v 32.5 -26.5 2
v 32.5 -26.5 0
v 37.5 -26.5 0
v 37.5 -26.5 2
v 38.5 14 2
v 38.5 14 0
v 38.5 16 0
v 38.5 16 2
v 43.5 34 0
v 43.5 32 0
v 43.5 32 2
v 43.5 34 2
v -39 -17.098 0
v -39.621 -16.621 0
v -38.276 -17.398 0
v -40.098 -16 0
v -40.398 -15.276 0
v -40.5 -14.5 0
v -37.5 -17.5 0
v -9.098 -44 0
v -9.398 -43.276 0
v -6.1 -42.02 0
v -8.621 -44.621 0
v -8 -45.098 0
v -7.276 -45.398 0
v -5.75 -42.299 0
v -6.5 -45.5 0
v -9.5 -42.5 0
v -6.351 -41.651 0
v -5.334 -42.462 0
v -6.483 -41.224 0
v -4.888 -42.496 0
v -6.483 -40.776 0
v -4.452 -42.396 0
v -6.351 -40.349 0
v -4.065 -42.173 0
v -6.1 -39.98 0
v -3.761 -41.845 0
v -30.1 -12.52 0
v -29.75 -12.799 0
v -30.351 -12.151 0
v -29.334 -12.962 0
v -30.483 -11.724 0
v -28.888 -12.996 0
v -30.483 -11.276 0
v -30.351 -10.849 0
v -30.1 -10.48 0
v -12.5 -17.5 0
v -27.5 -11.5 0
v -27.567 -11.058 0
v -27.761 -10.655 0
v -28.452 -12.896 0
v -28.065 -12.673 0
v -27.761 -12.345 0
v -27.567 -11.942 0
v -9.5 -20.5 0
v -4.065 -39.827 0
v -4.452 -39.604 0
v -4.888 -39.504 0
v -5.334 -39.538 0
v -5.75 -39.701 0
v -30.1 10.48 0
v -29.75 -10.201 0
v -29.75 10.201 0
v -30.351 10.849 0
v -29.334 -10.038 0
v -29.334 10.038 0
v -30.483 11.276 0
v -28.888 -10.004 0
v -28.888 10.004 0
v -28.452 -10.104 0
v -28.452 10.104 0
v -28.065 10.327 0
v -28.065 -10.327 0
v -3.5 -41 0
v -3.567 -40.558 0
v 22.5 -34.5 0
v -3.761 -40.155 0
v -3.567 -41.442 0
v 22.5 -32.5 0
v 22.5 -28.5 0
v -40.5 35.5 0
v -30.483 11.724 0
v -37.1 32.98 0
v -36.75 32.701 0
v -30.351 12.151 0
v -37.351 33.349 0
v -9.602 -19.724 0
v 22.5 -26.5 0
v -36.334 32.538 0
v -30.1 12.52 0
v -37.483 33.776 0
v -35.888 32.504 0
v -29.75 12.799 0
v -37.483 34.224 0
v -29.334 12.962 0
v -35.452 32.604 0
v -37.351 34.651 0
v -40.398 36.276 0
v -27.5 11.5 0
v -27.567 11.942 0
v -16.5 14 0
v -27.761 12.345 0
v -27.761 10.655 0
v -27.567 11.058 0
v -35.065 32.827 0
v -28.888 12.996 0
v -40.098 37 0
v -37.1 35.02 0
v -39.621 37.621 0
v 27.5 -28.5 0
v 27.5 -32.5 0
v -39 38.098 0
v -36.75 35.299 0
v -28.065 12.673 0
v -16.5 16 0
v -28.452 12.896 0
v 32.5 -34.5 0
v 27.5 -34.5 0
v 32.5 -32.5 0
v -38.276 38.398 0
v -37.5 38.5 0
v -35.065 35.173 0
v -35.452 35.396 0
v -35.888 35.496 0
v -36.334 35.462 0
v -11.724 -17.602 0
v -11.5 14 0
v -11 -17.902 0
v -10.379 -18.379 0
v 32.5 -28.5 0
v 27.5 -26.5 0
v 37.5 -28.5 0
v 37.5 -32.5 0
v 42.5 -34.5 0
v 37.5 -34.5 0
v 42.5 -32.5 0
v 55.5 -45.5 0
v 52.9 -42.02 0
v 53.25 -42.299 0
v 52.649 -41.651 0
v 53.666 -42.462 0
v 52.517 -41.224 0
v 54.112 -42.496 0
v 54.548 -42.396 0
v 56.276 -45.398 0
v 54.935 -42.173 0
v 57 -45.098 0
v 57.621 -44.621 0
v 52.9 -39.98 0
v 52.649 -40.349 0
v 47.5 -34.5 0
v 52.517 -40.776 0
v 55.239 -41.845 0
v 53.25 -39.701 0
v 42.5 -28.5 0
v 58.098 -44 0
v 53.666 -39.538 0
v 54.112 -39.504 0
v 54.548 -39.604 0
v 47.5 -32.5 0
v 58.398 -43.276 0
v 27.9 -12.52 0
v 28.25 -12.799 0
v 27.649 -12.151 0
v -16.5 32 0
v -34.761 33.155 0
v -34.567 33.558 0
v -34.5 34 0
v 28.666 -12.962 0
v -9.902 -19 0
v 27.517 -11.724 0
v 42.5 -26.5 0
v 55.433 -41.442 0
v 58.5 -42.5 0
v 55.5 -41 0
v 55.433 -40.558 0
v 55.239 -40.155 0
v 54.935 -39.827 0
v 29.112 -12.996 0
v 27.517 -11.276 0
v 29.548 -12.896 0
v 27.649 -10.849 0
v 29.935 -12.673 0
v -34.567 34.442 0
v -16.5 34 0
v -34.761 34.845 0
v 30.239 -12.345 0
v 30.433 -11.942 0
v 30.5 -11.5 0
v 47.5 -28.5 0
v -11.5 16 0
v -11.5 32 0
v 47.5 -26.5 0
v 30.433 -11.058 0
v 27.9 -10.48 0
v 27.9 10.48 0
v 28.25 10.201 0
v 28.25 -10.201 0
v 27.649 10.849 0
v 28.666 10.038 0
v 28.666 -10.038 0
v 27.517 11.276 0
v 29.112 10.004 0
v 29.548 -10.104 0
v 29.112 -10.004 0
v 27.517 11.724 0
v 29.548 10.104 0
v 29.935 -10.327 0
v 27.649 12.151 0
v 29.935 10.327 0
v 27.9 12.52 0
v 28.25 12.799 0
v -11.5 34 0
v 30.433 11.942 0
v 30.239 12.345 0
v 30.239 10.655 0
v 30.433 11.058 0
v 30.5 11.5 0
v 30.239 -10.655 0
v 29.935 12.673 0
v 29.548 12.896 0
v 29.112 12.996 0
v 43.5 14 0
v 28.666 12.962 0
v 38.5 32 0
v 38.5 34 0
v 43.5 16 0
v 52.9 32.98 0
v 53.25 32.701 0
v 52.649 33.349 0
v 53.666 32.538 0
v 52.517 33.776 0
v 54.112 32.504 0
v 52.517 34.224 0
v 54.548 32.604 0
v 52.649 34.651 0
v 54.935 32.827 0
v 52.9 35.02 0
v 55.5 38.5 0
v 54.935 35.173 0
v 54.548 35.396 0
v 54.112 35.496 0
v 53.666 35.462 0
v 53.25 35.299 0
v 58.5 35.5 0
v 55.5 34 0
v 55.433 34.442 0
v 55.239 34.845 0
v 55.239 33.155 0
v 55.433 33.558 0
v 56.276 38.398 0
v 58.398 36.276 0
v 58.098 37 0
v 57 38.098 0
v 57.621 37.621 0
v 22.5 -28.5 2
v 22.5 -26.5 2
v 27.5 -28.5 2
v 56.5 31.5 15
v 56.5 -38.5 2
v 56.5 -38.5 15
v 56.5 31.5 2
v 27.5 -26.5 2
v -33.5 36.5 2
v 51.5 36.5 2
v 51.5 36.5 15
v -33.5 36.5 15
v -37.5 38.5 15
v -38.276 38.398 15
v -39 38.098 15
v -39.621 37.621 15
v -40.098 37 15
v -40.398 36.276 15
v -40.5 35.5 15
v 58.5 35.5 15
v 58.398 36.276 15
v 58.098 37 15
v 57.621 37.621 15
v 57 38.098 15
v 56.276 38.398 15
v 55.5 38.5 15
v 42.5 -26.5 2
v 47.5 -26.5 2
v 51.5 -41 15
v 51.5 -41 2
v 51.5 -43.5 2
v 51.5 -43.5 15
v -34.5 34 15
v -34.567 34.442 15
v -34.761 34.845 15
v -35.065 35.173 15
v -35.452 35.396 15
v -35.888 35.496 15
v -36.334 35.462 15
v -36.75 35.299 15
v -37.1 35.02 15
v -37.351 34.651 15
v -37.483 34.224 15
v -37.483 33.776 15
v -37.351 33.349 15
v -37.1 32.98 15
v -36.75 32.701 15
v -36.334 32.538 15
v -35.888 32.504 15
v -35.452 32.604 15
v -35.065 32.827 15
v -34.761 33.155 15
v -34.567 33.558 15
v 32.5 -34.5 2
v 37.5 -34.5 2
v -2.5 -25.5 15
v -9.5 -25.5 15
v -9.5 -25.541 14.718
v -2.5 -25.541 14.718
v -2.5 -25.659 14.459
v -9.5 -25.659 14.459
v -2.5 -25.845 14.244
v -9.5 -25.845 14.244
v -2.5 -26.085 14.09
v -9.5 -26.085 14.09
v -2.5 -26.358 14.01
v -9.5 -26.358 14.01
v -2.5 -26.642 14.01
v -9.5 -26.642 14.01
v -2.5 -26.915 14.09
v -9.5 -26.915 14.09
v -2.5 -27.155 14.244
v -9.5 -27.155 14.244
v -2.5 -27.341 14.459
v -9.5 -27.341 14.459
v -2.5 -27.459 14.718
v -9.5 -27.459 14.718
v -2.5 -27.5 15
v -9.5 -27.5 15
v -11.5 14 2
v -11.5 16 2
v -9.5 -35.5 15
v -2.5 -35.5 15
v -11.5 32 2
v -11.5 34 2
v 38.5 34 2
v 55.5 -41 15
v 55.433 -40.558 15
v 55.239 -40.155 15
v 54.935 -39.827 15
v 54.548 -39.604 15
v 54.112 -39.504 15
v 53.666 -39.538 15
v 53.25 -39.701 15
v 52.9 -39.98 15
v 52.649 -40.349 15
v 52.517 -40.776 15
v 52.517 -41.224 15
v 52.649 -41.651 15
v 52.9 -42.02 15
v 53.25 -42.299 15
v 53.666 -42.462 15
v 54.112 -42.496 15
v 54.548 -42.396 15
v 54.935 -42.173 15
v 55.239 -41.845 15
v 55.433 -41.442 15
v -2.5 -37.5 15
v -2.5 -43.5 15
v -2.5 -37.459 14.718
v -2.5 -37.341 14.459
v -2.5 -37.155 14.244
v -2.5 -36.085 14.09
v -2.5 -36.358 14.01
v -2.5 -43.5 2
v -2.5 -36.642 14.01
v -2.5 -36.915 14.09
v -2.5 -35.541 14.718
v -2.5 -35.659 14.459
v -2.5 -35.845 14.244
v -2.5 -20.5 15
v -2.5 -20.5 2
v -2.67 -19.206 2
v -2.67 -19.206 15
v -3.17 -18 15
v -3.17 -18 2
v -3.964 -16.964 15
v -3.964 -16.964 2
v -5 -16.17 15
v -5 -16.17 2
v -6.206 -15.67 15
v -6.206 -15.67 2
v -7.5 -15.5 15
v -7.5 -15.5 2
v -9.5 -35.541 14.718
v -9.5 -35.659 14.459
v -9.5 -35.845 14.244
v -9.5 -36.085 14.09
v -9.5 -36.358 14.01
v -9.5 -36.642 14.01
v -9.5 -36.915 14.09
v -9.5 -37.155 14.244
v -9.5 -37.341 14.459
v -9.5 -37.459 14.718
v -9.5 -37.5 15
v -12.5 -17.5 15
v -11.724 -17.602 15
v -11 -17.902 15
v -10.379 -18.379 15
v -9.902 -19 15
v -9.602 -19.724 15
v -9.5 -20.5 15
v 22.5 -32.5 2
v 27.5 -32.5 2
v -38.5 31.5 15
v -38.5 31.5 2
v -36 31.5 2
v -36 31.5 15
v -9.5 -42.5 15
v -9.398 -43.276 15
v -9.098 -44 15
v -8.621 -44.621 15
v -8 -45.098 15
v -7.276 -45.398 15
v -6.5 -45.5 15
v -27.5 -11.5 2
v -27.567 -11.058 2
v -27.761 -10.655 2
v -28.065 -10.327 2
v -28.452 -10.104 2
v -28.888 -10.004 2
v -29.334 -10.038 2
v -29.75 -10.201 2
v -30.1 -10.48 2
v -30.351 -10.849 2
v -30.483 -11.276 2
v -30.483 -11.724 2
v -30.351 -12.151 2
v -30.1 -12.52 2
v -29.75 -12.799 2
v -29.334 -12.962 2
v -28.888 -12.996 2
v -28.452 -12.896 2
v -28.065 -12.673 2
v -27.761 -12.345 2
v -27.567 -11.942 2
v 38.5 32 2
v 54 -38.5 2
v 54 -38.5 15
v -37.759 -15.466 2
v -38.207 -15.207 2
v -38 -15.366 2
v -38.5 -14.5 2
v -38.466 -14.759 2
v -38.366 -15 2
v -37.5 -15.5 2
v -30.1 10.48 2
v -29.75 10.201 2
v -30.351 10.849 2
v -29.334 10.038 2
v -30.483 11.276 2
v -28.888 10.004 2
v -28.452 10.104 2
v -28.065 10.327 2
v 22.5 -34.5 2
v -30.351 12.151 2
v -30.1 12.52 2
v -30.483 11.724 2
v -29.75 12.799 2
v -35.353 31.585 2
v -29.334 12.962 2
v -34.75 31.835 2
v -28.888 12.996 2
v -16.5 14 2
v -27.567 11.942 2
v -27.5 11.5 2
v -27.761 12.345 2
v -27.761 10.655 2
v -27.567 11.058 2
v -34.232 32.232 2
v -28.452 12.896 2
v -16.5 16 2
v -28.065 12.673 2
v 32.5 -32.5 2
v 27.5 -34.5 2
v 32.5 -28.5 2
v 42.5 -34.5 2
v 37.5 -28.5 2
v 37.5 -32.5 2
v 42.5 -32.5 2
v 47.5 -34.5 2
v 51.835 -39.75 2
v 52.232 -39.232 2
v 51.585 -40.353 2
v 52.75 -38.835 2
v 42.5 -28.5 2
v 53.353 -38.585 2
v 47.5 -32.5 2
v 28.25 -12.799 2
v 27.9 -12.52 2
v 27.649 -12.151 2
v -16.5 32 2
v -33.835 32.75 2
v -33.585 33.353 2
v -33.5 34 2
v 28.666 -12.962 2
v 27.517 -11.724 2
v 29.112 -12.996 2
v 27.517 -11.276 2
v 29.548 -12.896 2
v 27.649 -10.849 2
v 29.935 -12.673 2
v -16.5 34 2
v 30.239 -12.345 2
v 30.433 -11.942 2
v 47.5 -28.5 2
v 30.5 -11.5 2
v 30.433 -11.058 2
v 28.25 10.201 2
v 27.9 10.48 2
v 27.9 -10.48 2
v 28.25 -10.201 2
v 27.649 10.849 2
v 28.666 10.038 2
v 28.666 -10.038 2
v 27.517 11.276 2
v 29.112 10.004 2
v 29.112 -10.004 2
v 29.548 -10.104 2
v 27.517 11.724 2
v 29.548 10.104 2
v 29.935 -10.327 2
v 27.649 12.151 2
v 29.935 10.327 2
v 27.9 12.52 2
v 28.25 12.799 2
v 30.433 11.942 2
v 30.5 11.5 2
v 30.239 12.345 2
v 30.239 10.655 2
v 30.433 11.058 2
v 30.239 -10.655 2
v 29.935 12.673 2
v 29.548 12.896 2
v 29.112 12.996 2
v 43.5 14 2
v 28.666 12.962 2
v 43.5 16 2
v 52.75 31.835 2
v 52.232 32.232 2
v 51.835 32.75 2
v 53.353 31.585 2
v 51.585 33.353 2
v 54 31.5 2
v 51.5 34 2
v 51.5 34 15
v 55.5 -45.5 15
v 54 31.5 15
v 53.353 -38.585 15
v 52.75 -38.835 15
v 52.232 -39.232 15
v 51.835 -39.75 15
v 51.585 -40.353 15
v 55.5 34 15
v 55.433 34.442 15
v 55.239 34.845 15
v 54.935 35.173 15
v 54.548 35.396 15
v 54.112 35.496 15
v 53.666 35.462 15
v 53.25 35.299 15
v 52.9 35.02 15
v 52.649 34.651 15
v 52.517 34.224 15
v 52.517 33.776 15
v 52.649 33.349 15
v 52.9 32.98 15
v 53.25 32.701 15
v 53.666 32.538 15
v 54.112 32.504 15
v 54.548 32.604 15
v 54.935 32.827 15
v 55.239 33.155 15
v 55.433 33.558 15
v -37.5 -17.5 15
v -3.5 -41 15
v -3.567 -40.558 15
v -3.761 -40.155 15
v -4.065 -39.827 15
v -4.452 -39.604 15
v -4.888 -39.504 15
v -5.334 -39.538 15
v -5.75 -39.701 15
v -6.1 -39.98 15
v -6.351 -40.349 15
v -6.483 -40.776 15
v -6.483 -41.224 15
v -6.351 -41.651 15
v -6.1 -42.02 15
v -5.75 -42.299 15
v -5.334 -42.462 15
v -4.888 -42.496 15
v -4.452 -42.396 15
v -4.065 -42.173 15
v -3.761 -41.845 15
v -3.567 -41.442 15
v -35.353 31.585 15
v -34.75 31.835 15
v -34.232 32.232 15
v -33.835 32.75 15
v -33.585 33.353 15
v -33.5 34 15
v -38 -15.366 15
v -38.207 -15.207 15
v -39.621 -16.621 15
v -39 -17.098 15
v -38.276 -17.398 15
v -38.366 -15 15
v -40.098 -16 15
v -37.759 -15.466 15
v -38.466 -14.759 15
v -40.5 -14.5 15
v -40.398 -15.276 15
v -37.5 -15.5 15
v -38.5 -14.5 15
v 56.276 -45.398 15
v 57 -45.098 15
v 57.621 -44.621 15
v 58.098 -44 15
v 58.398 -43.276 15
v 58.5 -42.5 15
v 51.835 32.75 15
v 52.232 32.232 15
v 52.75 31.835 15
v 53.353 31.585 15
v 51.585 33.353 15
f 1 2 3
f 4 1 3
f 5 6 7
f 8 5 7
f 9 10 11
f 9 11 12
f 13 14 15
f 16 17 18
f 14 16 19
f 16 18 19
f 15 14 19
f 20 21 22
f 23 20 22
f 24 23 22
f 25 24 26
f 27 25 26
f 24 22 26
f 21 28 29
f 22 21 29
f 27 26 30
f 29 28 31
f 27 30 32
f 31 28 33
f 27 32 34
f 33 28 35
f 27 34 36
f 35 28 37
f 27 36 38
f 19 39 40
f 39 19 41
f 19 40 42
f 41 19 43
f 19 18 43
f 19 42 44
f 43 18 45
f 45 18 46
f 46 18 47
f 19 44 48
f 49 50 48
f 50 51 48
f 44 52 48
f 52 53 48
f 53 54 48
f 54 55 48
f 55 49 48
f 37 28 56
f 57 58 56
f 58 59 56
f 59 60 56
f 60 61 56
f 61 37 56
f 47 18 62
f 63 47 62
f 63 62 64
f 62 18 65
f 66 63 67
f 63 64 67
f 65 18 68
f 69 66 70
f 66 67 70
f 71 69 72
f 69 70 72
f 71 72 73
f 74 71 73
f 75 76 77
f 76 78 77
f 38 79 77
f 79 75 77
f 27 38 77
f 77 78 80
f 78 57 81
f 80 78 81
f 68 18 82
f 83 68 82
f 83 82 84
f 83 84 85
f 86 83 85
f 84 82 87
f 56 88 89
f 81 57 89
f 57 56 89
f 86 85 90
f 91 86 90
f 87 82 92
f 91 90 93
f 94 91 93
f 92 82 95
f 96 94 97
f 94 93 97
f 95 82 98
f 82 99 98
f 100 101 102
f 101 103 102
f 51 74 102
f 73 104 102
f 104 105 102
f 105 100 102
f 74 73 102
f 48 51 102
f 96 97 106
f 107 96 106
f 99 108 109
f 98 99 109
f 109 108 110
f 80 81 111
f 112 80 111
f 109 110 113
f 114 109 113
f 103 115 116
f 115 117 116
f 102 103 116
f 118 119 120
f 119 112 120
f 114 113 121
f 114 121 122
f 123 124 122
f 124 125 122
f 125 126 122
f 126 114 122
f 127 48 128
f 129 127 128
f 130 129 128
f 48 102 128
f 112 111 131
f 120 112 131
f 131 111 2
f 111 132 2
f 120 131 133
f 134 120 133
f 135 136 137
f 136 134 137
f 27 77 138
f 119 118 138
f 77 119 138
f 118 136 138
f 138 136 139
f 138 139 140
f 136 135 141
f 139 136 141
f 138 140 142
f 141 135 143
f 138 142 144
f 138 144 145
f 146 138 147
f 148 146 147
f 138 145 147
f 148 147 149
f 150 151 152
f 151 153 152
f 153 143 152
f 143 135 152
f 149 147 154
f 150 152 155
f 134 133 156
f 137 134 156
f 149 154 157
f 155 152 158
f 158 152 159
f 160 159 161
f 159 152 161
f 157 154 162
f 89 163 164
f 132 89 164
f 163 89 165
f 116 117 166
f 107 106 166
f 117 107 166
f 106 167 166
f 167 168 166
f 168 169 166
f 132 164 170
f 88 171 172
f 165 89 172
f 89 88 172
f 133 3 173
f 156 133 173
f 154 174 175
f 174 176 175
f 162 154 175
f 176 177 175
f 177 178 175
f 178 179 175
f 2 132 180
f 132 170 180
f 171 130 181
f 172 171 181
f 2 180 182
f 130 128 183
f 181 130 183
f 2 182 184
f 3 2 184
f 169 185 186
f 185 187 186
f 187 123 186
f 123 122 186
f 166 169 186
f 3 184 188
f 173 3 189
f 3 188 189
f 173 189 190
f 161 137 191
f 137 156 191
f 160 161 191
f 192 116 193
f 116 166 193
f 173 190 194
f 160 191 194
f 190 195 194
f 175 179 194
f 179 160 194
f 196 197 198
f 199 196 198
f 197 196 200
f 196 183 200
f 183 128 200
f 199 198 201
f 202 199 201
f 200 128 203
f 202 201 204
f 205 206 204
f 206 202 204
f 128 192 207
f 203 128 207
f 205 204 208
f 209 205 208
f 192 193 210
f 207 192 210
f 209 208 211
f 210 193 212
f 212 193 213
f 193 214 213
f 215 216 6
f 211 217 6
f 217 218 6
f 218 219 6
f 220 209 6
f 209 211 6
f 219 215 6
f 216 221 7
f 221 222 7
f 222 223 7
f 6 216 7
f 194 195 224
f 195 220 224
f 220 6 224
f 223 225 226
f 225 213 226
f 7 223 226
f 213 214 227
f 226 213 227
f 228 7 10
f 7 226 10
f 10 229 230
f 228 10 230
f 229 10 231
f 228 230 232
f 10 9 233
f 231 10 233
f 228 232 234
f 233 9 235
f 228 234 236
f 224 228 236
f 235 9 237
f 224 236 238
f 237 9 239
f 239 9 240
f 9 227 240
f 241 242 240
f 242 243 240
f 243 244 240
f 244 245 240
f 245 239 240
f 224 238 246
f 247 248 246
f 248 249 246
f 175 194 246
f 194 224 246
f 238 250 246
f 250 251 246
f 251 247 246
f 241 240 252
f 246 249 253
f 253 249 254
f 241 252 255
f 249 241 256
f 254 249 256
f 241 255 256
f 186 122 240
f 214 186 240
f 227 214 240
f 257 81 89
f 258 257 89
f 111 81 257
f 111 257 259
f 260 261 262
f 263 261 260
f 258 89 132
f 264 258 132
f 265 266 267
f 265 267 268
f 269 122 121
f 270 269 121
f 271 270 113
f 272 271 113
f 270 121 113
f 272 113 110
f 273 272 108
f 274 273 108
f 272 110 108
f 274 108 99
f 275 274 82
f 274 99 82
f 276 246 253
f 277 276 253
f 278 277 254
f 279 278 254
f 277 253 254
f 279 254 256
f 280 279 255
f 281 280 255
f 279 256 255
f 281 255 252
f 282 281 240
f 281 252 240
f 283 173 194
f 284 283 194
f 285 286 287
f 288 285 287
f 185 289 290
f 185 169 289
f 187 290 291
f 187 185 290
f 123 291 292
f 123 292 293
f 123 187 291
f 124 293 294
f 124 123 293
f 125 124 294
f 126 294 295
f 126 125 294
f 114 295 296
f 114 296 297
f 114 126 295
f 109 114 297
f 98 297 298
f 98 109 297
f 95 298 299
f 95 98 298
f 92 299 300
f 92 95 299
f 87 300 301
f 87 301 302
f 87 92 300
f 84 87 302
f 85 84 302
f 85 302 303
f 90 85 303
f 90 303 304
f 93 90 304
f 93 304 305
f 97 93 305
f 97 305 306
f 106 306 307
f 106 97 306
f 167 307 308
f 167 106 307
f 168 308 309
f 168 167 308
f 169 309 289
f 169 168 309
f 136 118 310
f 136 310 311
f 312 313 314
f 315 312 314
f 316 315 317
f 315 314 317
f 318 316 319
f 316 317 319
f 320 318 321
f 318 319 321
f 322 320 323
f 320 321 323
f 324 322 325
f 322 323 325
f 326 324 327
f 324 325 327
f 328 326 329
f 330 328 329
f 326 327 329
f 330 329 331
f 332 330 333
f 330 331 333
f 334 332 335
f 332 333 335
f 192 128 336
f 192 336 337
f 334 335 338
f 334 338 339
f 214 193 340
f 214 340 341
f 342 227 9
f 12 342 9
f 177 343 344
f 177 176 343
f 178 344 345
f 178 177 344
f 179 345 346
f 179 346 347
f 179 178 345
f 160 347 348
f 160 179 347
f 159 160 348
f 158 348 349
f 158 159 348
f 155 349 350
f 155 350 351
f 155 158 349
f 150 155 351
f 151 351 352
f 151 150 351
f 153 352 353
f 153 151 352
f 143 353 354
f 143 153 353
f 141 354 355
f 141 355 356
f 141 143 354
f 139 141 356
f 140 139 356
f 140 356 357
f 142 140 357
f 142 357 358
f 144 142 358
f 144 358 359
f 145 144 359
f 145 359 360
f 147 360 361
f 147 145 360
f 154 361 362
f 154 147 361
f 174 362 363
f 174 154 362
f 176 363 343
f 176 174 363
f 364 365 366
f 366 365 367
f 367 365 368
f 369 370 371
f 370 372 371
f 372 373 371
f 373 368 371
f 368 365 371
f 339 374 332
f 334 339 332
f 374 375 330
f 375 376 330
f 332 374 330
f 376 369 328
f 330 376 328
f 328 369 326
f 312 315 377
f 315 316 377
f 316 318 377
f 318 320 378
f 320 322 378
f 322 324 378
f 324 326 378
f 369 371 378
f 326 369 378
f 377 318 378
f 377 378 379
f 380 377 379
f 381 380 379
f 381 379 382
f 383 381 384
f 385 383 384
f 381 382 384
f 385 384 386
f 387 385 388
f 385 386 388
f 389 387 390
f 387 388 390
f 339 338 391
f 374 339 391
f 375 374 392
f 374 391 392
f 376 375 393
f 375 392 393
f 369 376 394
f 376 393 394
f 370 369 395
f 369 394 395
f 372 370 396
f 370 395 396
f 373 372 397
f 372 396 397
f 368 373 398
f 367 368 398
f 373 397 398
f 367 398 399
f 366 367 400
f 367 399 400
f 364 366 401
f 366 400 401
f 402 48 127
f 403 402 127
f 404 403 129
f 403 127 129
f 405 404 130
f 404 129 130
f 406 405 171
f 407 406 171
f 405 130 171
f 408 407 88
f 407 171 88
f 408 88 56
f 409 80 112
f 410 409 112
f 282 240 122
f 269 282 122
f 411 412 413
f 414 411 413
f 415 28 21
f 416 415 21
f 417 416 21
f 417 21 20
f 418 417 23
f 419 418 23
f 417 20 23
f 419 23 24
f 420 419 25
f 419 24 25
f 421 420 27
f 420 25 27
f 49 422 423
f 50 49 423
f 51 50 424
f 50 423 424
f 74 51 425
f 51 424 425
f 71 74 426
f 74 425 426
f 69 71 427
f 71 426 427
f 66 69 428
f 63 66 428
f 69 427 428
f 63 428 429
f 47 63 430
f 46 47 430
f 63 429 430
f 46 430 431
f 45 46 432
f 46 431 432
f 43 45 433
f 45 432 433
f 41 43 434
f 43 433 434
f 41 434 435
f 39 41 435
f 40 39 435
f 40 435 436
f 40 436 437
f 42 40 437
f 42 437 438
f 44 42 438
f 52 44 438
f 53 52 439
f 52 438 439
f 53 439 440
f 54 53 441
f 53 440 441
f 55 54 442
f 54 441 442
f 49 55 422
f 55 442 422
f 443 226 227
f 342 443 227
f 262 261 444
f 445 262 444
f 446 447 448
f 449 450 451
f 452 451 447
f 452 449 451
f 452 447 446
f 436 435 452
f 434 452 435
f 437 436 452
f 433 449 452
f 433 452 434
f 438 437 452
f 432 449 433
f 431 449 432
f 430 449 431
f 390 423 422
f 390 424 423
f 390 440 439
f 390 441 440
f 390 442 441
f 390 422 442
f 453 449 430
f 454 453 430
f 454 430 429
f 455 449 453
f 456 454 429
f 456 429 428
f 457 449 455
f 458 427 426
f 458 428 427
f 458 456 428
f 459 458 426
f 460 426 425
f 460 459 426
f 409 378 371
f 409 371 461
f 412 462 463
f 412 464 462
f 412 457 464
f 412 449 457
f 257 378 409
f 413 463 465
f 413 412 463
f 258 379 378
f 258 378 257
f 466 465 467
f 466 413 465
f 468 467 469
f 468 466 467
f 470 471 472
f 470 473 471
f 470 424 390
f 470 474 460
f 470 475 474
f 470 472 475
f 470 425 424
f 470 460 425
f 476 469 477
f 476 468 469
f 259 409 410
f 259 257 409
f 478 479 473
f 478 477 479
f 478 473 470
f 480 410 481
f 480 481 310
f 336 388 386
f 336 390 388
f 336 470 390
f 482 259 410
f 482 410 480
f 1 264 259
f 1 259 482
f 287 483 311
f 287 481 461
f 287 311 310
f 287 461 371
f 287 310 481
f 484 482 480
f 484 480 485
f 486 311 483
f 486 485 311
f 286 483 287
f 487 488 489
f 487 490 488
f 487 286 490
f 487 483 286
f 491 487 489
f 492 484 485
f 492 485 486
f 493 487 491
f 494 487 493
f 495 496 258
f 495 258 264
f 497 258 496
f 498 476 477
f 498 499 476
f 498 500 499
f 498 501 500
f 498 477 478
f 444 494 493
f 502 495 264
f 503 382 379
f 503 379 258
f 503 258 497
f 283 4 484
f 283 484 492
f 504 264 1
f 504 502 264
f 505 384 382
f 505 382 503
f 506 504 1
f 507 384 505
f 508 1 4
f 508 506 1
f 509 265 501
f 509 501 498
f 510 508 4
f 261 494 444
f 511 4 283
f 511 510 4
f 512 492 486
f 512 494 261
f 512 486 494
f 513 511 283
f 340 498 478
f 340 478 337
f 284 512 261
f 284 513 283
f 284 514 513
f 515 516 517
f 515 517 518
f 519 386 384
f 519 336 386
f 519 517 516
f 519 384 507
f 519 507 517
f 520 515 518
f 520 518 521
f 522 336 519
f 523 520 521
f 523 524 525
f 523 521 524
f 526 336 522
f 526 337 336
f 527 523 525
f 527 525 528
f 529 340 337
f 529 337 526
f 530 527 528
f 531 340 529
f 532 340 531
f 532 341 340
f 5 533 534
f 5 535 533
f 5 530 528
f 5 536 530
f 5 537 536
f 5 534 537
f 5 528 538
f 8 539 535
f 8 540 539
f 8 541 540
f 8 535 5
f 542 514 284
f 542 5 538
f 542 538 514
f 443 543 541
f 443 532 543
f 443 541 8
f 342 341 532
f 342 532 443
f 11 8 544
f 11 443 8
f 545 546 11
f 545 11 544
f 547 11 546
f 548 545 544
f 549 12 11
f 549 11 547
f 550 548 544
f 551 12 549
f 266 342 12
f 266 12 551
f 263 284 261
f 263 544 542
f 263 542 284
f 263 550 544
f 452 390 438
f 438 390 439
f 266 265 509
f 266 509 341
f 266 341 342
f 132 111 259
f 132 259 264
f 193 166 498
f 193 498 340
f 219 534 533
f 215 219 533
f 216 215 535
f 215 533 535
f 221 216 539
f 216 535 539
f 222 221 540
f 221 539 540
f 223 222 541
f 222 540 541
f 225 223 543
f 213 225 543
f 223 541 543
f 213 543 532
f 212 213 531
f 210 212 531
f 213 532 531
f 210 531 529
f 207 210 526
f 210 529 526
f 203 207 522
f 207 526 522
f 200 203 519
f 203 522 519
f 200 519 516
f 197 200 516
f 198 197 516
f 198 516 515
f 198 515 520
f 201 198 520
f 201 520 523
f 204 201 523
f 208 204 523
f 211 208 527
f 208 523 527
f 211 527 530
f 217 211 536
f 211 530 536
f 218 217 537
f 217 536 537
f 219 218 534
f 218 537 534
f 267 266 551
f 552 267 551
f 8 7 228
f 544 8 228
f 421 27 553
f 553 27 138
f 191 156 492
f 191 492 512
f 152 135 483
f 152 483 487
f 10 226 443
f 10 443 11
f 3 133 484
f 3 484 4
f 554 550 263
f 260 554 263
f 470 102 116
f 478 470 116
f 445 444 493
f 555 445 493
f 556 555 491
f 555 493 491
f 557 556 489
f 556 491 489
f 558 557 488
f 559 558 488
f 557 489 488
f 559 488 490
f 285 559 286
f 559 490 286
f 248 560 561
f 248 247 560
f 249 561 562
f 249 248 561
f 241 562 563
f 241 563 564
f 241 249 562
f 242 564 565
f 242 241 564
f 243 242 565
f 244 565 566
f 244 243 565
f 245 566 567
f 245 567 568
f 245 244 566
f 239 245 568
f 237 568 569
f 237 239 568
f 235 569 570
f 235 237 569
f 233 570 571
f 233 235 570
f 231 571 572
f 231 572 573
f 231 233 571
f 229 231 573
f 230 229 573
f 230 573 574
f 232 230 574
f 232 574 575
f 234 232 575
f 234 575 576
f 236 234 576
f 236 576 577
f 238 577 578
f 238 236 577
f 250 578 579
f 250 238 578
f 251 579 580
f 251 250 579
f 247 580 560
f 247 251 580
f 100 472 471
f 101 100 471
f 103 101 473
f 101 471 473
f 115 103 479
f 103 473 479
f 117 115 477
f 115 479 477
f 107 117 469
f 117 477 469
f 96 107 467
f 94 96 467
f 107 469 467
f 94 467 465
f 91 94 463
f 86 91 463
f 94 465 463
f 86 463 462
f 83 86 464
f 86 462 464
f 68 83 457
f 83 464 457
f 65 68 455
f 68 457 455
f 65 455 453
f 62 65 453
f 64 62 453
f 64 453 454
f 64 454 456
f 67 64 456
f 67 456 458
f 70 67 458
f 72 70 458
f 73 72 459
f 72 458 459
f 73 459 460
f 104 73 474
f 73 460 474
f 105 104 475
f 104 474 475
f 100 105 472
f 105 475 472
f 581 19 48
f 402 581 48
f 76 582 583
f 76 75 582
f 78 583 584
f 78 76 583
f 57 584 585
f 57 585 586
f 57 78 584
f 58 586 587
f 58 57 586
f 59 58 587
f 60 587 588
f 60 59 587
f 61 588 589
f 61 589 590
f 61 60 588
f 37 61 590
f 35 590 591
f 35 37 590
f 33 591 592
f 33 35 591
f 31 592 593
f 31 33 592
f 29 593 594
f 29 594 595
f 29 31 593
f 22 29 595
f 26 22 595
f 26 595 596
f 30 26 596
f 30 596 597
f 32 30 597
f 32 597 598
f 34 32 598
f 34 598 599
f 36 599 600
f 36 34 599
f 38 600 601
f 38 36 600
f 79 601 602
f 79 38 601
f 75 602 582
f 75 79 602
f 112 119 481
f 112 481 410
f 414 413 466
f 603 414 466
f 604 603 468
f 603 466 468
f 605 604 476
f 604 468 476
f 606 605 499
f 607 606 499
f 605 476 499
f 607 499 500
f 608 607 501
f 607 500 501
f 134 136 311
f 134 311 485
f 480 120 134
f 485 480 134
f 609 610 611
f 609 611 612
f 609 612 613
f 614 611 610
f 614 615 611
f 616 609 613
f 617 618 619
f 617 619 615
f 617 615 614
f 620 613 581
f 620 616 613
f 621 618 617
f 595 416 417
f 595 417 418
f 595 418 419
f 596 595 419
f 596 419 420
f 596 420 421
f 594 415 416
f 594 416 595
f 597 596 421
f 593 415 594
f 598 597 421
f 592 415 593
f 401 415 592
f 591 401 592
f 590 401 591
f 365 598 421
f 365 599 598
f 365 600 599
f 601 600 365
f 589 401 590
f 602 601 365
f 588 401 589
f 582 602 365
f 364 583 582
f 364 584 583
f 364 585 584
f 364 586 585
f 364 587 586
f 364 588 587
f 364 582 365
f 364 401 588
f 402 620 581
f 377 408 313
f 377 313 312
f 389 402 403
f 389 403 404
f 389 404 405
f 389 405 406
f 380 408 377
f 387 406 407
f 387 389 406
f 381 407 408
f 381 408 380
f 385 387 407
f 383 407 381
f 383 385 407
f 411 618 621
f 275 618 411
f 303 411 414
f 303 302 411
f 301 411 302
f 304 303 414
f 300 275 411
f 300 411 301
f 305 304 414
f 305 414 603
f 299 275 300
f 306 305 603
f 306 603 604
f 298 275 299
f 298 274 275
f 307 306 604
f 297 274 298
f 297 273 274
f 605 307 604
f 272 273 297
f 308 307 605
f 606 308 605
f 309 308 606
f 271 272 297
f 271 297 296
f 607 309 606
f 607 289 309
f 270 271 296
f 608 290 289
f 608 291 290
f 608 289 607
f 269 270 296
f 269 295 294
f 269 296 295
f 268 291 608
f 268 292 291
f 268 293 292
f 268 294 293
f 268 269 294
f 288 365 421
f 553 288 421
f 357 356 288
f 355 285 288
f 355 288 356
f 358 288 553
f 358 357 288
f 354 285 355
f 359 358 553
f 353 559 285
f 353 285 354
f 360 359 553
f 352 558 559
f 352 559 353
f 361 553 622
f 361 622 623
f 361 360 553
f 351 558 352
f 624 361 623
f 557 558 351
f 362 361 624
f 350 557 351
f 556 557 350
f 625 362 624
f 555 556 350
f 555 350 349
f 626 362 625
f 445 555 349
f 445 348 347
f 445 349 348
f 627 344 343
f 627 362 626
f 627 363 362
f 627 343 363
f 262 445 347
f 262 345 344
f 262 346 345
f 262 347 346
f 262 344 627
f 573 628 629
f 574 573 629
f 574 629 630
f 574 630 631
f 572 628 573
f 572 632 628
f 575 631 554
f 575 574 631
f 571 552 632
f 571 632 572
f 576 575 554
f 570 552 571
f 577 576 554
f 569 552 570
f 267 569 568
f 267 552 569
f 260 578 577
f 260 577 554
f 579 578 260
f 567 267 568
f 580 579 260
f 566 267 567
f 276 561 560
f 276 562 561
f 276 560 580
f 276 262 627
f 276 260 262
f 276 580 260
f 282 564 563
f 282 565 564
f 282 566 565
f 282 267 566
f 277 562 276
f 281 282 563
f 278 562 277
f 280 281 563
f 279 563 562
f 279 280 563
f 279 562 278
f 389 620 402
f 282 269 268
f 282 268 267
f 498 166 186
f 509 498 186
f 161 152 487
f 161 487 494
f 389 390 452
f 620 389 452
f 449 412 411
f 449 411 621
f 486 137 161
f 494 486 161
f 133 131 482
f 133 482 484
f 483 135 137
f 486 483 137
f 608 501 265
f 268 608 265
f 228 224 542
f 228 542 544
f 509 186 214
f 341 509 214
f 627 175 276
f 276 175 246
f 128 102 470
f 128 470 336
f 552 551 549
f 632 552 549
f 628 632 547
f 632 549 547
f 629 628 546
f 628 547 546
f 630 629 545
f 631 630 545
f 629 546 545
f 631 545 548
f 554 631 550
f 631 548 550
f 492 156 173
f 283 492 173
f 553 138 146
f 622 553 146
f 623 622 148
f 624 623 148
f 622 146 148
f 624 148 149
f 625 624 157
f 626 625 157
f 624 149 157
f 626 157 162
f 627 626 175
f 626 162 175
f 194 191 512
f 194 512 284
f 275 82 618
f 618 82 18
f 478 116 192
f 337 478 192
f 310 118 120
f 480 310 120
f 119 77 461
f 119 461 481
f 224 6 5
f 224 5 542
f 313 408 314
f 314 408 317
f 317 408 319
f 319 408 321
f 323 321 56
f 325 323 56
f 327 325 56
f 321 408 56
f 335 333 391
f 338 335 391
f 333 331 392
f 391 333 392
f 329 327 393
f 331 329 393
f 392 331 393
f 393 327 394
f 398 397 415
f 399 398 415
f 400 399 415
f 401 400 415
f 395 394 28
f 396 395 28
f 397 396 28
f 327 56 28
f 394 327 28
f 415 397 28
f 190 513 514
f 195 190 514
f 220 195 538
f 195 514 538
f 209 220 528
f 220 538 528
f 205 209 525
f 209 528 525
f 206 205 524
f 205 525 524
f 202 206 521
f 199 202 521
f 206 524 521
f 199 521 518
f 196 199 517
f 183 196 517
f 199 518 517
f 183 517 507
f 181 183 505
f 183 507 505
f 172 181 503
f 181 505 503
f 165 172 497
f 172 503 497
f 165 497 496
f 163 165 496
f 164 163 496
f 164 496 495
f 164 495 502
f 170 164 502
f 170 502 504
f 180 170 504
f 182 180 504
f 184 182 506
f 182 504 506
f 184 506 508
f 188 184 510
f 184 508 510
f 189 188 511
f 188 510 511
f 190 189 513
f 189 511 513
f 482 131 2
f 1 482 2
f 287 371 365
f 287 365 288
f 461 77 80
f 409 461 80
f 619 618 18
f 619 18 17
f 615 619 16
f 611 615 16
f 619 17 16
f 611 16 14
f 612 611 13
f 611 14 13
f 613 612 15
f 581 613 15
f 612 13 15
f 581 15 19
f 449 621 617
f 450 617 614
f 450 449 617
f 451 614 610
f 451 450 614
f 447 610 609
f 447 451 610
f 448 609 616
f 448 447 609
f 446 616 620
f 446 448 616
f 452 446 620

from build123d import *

# Parameters (mm, degrees)
F1_DEPTH  = 15
F2_T      = -2
F3_R      = 1.5
F4_DEPTH  = 2
F5_R      = 1.5
F6_DEPTH  = 13
F7_W      = 5
F7_H      = 2
F8_DEPTH  = 2
F9_R      = 1.5
F10_DEPTH = 2
F11_R     = 1
F12_DEPTH = 7


with BuildPart() as f1:
    # F0 (on Top) → F1 (new body)
    with BuildSketch(Plane.XY):
        with BuildLine():
            Line((-40.5, 35.5), (-40.5, 14.5))
            Line((-40.5, 14.5), (-40.5, -14.5))
            ThreePointArc((-40.5, -14.5), (-39.6213203436, -16.6213203436), (-37.5, -17.5))
            Line((-37.5, -17.5), (-12.5, -17.5))
            ThreePointArc((-12.5, -17.5), (-10.3786796564, -18.3786796564), (-9.5, -20.5))
            Line((-9.5, -20.5), (-9.5, -42.5))
            ThreePointArc((-9.5, -42.5), (-8.6213203436, -44.6213203436), (-6.5, -45.5))
            Line((-6.5, -45.5), (55.5, -45.5))
            ThreePointArc((55.5, -45.5), (57.6213203436, -44.6213203436), (58.5, -42.5))
            Line((58.5, -42.5), (58.5, 35.5))
            ThreePointArc((58.5, 35.5), (57.6213203436, 37.6213203436), (55.5, 38.5))
            Line((55.5, 38.5), (-37.5, 38.5))
            ThreePointArc((-37.5, 38.5), (-39.6213203436, 37.6213203436), (-40.5, 35.5))
        make_face()
    extrude(amount=F1_DEPTH)

    # F2
    f2_openings = [f1.faces().sort_by_distance(p)[0] for p in [
        (12.966173, -0.233802, 15),
    ]]
    offset(amount=F2_T, openings=f2_openings)

    # F3 (on face) → F4 (cut, through all)
    with BuildSketch(Plane.XY.offset(2)):
        with Locations((-29, 11.5)):
            Circle(F3_R)
        with Locations((29, 11.5)):
            Circle(F3_R)
        with Locations((-29, -11.5)):
            Circle(F3_R)
        with Locations((29, -11.5)):
            Circle(F3_R)
    extrude(amount=-F4_DEPTH, mode=Mode.SUBTRACT)

    # F5 (on face) → F6 (join, through all)
    with BuildSketch(Plane.XY.offset(2)):
        with BuildLine():
            Line((-2.5, -43.5), (-2.5, -41))
            Line((-2.5, -41), (-2.5, -20.5))
            ThreePointArc((-2.5, -20.5), (-3.9644660941, -16.9644660941), (-7.5, -15.5))
            Line((-7.5, -15.5), (-12.5, -15.5))
            Line((-12.5, -15.5), (-7.5, -20.5))
            Line((-7.5, -20.5), (-7.5, -38.5))
            Line((-7.5, -38.5), (-7.5, -43.5))
            Line((-7.5, -43.5), (-2.5, -43.5))
        make_face()
        with Locations((-5, -41)):
            Circle(F5_R, mode=Mode.SUBTRACT)
        with BuildLine():
            ThreePointArc((54, -38.5), (52.232233047, -39.232233047), (51.5, -41))
            Line((51.5, -41), (51.5, -43.5))
            Line((51.5, -43.5), (56.5, -43.5))
            Line((56.5, -43.5), (56.5, -38.5))
            Line((56.5, -38.5), (54, -38.5))
        make_face()
        with Locations((54, -41)):
            Circle(F5_R, mode=Mode.SUBTRACT)
        with BuildLine():
            ThreePointArc((51.5, 34), (52.232233047, 32.232233047), (54, 31.5))
            Line((54, 31.5), (56.5, 31.5))
            Line((56.5, 31.5), (56.5, 36.5))
            Line((56.5, 36.5), (51.5, 36.5))
            Line((51.5, 36.5), (51.5, 34))
        make_face()
        with Locations((54, 34)):
            Circle(F5_R, mode=Mode.SUBTRACT)
        with BuildLine():
            Line((-38.5, 31.5), (-36, 31.5))
            ThreePointArc((-36, 31.5), (-34.232233047, 32.232233047), (-33.5, 34))
            Line((-33.5, 34), (-33.5, 36.5))
            Line((-33.5, 36.5), (-38.5, 36.5))
            Line((-38.5, 36.5), (-38.5, 31.5))
        make_face()
        with Locations((-36, 34)):
            Circle(F5_R, mode=Mode.SUBTRACT)
    extrude(amount=F6_DEPTH)

    # F7 (on Top) → F8 (cut, through all)
    with BuildSketch(Plane.XY):
        with Locations((-14, 33)):
            Rectangle(F7_W, F7_H)
        with Locations((41, 33)):
            Rectangle(F7_W, F7_H)
        with Locations((41, 15)):
            Rectangle(F7_W, F7_H)
        with Locations((-14, 15)):
            Rectangle(F7_W, F7_H)
        with Locations((25, -27.5)):
            Rectangle(F7_W, F7_H)
        with Locations((25, -33.5)):
            Rectangle(F7_W, F7_H)
        with Locations((35, -27.5)):
            Rectangle(F7_W, F7_H)
        with Locations((35, -33.5)):
            Rectangle(F7_W, F7_H)
        with Locations((45, -27.5)):
            Rectangle(F7_W, F7_H)
        with Locations((45, -33.5)):
            Rectangle(F7_W, F7_H)
    extrude(amount=F8_DEPTH, mode=Mode.SUBTRACT)

    # F9 (on face) → F10 (cut, through all)
    with BuildSketch(Plane.XY.offset(2)):
        with Locations((54, 34)):
            Circle(F9_R)
        with Locations((-36, 34)):
            Circle(F9_R)
        with Locations((-5, -41)):
            Circle(F9_R)
        with Locations((54, -41)):
            Circle(F9_R)
    extrude(amount=-F10_DEPTH, mode=Mode.SUBTRACT)

    # F11 (on face) → F12 (cut, through all)
    with BuildSketch(Plane(origin=(-9.5, 0, 0), x_dir=(0, -1, 0), z_dir=(-1, 0, 0))):
        with Locations((26.5, 15)):
            Circle(F11_R)
        with Locations((36.5, 15)):
            Circle(F11_R)
    extrude(amount=-F12_DEPTH, mode=Mode.SUBTRACT)


solid = f1.part
